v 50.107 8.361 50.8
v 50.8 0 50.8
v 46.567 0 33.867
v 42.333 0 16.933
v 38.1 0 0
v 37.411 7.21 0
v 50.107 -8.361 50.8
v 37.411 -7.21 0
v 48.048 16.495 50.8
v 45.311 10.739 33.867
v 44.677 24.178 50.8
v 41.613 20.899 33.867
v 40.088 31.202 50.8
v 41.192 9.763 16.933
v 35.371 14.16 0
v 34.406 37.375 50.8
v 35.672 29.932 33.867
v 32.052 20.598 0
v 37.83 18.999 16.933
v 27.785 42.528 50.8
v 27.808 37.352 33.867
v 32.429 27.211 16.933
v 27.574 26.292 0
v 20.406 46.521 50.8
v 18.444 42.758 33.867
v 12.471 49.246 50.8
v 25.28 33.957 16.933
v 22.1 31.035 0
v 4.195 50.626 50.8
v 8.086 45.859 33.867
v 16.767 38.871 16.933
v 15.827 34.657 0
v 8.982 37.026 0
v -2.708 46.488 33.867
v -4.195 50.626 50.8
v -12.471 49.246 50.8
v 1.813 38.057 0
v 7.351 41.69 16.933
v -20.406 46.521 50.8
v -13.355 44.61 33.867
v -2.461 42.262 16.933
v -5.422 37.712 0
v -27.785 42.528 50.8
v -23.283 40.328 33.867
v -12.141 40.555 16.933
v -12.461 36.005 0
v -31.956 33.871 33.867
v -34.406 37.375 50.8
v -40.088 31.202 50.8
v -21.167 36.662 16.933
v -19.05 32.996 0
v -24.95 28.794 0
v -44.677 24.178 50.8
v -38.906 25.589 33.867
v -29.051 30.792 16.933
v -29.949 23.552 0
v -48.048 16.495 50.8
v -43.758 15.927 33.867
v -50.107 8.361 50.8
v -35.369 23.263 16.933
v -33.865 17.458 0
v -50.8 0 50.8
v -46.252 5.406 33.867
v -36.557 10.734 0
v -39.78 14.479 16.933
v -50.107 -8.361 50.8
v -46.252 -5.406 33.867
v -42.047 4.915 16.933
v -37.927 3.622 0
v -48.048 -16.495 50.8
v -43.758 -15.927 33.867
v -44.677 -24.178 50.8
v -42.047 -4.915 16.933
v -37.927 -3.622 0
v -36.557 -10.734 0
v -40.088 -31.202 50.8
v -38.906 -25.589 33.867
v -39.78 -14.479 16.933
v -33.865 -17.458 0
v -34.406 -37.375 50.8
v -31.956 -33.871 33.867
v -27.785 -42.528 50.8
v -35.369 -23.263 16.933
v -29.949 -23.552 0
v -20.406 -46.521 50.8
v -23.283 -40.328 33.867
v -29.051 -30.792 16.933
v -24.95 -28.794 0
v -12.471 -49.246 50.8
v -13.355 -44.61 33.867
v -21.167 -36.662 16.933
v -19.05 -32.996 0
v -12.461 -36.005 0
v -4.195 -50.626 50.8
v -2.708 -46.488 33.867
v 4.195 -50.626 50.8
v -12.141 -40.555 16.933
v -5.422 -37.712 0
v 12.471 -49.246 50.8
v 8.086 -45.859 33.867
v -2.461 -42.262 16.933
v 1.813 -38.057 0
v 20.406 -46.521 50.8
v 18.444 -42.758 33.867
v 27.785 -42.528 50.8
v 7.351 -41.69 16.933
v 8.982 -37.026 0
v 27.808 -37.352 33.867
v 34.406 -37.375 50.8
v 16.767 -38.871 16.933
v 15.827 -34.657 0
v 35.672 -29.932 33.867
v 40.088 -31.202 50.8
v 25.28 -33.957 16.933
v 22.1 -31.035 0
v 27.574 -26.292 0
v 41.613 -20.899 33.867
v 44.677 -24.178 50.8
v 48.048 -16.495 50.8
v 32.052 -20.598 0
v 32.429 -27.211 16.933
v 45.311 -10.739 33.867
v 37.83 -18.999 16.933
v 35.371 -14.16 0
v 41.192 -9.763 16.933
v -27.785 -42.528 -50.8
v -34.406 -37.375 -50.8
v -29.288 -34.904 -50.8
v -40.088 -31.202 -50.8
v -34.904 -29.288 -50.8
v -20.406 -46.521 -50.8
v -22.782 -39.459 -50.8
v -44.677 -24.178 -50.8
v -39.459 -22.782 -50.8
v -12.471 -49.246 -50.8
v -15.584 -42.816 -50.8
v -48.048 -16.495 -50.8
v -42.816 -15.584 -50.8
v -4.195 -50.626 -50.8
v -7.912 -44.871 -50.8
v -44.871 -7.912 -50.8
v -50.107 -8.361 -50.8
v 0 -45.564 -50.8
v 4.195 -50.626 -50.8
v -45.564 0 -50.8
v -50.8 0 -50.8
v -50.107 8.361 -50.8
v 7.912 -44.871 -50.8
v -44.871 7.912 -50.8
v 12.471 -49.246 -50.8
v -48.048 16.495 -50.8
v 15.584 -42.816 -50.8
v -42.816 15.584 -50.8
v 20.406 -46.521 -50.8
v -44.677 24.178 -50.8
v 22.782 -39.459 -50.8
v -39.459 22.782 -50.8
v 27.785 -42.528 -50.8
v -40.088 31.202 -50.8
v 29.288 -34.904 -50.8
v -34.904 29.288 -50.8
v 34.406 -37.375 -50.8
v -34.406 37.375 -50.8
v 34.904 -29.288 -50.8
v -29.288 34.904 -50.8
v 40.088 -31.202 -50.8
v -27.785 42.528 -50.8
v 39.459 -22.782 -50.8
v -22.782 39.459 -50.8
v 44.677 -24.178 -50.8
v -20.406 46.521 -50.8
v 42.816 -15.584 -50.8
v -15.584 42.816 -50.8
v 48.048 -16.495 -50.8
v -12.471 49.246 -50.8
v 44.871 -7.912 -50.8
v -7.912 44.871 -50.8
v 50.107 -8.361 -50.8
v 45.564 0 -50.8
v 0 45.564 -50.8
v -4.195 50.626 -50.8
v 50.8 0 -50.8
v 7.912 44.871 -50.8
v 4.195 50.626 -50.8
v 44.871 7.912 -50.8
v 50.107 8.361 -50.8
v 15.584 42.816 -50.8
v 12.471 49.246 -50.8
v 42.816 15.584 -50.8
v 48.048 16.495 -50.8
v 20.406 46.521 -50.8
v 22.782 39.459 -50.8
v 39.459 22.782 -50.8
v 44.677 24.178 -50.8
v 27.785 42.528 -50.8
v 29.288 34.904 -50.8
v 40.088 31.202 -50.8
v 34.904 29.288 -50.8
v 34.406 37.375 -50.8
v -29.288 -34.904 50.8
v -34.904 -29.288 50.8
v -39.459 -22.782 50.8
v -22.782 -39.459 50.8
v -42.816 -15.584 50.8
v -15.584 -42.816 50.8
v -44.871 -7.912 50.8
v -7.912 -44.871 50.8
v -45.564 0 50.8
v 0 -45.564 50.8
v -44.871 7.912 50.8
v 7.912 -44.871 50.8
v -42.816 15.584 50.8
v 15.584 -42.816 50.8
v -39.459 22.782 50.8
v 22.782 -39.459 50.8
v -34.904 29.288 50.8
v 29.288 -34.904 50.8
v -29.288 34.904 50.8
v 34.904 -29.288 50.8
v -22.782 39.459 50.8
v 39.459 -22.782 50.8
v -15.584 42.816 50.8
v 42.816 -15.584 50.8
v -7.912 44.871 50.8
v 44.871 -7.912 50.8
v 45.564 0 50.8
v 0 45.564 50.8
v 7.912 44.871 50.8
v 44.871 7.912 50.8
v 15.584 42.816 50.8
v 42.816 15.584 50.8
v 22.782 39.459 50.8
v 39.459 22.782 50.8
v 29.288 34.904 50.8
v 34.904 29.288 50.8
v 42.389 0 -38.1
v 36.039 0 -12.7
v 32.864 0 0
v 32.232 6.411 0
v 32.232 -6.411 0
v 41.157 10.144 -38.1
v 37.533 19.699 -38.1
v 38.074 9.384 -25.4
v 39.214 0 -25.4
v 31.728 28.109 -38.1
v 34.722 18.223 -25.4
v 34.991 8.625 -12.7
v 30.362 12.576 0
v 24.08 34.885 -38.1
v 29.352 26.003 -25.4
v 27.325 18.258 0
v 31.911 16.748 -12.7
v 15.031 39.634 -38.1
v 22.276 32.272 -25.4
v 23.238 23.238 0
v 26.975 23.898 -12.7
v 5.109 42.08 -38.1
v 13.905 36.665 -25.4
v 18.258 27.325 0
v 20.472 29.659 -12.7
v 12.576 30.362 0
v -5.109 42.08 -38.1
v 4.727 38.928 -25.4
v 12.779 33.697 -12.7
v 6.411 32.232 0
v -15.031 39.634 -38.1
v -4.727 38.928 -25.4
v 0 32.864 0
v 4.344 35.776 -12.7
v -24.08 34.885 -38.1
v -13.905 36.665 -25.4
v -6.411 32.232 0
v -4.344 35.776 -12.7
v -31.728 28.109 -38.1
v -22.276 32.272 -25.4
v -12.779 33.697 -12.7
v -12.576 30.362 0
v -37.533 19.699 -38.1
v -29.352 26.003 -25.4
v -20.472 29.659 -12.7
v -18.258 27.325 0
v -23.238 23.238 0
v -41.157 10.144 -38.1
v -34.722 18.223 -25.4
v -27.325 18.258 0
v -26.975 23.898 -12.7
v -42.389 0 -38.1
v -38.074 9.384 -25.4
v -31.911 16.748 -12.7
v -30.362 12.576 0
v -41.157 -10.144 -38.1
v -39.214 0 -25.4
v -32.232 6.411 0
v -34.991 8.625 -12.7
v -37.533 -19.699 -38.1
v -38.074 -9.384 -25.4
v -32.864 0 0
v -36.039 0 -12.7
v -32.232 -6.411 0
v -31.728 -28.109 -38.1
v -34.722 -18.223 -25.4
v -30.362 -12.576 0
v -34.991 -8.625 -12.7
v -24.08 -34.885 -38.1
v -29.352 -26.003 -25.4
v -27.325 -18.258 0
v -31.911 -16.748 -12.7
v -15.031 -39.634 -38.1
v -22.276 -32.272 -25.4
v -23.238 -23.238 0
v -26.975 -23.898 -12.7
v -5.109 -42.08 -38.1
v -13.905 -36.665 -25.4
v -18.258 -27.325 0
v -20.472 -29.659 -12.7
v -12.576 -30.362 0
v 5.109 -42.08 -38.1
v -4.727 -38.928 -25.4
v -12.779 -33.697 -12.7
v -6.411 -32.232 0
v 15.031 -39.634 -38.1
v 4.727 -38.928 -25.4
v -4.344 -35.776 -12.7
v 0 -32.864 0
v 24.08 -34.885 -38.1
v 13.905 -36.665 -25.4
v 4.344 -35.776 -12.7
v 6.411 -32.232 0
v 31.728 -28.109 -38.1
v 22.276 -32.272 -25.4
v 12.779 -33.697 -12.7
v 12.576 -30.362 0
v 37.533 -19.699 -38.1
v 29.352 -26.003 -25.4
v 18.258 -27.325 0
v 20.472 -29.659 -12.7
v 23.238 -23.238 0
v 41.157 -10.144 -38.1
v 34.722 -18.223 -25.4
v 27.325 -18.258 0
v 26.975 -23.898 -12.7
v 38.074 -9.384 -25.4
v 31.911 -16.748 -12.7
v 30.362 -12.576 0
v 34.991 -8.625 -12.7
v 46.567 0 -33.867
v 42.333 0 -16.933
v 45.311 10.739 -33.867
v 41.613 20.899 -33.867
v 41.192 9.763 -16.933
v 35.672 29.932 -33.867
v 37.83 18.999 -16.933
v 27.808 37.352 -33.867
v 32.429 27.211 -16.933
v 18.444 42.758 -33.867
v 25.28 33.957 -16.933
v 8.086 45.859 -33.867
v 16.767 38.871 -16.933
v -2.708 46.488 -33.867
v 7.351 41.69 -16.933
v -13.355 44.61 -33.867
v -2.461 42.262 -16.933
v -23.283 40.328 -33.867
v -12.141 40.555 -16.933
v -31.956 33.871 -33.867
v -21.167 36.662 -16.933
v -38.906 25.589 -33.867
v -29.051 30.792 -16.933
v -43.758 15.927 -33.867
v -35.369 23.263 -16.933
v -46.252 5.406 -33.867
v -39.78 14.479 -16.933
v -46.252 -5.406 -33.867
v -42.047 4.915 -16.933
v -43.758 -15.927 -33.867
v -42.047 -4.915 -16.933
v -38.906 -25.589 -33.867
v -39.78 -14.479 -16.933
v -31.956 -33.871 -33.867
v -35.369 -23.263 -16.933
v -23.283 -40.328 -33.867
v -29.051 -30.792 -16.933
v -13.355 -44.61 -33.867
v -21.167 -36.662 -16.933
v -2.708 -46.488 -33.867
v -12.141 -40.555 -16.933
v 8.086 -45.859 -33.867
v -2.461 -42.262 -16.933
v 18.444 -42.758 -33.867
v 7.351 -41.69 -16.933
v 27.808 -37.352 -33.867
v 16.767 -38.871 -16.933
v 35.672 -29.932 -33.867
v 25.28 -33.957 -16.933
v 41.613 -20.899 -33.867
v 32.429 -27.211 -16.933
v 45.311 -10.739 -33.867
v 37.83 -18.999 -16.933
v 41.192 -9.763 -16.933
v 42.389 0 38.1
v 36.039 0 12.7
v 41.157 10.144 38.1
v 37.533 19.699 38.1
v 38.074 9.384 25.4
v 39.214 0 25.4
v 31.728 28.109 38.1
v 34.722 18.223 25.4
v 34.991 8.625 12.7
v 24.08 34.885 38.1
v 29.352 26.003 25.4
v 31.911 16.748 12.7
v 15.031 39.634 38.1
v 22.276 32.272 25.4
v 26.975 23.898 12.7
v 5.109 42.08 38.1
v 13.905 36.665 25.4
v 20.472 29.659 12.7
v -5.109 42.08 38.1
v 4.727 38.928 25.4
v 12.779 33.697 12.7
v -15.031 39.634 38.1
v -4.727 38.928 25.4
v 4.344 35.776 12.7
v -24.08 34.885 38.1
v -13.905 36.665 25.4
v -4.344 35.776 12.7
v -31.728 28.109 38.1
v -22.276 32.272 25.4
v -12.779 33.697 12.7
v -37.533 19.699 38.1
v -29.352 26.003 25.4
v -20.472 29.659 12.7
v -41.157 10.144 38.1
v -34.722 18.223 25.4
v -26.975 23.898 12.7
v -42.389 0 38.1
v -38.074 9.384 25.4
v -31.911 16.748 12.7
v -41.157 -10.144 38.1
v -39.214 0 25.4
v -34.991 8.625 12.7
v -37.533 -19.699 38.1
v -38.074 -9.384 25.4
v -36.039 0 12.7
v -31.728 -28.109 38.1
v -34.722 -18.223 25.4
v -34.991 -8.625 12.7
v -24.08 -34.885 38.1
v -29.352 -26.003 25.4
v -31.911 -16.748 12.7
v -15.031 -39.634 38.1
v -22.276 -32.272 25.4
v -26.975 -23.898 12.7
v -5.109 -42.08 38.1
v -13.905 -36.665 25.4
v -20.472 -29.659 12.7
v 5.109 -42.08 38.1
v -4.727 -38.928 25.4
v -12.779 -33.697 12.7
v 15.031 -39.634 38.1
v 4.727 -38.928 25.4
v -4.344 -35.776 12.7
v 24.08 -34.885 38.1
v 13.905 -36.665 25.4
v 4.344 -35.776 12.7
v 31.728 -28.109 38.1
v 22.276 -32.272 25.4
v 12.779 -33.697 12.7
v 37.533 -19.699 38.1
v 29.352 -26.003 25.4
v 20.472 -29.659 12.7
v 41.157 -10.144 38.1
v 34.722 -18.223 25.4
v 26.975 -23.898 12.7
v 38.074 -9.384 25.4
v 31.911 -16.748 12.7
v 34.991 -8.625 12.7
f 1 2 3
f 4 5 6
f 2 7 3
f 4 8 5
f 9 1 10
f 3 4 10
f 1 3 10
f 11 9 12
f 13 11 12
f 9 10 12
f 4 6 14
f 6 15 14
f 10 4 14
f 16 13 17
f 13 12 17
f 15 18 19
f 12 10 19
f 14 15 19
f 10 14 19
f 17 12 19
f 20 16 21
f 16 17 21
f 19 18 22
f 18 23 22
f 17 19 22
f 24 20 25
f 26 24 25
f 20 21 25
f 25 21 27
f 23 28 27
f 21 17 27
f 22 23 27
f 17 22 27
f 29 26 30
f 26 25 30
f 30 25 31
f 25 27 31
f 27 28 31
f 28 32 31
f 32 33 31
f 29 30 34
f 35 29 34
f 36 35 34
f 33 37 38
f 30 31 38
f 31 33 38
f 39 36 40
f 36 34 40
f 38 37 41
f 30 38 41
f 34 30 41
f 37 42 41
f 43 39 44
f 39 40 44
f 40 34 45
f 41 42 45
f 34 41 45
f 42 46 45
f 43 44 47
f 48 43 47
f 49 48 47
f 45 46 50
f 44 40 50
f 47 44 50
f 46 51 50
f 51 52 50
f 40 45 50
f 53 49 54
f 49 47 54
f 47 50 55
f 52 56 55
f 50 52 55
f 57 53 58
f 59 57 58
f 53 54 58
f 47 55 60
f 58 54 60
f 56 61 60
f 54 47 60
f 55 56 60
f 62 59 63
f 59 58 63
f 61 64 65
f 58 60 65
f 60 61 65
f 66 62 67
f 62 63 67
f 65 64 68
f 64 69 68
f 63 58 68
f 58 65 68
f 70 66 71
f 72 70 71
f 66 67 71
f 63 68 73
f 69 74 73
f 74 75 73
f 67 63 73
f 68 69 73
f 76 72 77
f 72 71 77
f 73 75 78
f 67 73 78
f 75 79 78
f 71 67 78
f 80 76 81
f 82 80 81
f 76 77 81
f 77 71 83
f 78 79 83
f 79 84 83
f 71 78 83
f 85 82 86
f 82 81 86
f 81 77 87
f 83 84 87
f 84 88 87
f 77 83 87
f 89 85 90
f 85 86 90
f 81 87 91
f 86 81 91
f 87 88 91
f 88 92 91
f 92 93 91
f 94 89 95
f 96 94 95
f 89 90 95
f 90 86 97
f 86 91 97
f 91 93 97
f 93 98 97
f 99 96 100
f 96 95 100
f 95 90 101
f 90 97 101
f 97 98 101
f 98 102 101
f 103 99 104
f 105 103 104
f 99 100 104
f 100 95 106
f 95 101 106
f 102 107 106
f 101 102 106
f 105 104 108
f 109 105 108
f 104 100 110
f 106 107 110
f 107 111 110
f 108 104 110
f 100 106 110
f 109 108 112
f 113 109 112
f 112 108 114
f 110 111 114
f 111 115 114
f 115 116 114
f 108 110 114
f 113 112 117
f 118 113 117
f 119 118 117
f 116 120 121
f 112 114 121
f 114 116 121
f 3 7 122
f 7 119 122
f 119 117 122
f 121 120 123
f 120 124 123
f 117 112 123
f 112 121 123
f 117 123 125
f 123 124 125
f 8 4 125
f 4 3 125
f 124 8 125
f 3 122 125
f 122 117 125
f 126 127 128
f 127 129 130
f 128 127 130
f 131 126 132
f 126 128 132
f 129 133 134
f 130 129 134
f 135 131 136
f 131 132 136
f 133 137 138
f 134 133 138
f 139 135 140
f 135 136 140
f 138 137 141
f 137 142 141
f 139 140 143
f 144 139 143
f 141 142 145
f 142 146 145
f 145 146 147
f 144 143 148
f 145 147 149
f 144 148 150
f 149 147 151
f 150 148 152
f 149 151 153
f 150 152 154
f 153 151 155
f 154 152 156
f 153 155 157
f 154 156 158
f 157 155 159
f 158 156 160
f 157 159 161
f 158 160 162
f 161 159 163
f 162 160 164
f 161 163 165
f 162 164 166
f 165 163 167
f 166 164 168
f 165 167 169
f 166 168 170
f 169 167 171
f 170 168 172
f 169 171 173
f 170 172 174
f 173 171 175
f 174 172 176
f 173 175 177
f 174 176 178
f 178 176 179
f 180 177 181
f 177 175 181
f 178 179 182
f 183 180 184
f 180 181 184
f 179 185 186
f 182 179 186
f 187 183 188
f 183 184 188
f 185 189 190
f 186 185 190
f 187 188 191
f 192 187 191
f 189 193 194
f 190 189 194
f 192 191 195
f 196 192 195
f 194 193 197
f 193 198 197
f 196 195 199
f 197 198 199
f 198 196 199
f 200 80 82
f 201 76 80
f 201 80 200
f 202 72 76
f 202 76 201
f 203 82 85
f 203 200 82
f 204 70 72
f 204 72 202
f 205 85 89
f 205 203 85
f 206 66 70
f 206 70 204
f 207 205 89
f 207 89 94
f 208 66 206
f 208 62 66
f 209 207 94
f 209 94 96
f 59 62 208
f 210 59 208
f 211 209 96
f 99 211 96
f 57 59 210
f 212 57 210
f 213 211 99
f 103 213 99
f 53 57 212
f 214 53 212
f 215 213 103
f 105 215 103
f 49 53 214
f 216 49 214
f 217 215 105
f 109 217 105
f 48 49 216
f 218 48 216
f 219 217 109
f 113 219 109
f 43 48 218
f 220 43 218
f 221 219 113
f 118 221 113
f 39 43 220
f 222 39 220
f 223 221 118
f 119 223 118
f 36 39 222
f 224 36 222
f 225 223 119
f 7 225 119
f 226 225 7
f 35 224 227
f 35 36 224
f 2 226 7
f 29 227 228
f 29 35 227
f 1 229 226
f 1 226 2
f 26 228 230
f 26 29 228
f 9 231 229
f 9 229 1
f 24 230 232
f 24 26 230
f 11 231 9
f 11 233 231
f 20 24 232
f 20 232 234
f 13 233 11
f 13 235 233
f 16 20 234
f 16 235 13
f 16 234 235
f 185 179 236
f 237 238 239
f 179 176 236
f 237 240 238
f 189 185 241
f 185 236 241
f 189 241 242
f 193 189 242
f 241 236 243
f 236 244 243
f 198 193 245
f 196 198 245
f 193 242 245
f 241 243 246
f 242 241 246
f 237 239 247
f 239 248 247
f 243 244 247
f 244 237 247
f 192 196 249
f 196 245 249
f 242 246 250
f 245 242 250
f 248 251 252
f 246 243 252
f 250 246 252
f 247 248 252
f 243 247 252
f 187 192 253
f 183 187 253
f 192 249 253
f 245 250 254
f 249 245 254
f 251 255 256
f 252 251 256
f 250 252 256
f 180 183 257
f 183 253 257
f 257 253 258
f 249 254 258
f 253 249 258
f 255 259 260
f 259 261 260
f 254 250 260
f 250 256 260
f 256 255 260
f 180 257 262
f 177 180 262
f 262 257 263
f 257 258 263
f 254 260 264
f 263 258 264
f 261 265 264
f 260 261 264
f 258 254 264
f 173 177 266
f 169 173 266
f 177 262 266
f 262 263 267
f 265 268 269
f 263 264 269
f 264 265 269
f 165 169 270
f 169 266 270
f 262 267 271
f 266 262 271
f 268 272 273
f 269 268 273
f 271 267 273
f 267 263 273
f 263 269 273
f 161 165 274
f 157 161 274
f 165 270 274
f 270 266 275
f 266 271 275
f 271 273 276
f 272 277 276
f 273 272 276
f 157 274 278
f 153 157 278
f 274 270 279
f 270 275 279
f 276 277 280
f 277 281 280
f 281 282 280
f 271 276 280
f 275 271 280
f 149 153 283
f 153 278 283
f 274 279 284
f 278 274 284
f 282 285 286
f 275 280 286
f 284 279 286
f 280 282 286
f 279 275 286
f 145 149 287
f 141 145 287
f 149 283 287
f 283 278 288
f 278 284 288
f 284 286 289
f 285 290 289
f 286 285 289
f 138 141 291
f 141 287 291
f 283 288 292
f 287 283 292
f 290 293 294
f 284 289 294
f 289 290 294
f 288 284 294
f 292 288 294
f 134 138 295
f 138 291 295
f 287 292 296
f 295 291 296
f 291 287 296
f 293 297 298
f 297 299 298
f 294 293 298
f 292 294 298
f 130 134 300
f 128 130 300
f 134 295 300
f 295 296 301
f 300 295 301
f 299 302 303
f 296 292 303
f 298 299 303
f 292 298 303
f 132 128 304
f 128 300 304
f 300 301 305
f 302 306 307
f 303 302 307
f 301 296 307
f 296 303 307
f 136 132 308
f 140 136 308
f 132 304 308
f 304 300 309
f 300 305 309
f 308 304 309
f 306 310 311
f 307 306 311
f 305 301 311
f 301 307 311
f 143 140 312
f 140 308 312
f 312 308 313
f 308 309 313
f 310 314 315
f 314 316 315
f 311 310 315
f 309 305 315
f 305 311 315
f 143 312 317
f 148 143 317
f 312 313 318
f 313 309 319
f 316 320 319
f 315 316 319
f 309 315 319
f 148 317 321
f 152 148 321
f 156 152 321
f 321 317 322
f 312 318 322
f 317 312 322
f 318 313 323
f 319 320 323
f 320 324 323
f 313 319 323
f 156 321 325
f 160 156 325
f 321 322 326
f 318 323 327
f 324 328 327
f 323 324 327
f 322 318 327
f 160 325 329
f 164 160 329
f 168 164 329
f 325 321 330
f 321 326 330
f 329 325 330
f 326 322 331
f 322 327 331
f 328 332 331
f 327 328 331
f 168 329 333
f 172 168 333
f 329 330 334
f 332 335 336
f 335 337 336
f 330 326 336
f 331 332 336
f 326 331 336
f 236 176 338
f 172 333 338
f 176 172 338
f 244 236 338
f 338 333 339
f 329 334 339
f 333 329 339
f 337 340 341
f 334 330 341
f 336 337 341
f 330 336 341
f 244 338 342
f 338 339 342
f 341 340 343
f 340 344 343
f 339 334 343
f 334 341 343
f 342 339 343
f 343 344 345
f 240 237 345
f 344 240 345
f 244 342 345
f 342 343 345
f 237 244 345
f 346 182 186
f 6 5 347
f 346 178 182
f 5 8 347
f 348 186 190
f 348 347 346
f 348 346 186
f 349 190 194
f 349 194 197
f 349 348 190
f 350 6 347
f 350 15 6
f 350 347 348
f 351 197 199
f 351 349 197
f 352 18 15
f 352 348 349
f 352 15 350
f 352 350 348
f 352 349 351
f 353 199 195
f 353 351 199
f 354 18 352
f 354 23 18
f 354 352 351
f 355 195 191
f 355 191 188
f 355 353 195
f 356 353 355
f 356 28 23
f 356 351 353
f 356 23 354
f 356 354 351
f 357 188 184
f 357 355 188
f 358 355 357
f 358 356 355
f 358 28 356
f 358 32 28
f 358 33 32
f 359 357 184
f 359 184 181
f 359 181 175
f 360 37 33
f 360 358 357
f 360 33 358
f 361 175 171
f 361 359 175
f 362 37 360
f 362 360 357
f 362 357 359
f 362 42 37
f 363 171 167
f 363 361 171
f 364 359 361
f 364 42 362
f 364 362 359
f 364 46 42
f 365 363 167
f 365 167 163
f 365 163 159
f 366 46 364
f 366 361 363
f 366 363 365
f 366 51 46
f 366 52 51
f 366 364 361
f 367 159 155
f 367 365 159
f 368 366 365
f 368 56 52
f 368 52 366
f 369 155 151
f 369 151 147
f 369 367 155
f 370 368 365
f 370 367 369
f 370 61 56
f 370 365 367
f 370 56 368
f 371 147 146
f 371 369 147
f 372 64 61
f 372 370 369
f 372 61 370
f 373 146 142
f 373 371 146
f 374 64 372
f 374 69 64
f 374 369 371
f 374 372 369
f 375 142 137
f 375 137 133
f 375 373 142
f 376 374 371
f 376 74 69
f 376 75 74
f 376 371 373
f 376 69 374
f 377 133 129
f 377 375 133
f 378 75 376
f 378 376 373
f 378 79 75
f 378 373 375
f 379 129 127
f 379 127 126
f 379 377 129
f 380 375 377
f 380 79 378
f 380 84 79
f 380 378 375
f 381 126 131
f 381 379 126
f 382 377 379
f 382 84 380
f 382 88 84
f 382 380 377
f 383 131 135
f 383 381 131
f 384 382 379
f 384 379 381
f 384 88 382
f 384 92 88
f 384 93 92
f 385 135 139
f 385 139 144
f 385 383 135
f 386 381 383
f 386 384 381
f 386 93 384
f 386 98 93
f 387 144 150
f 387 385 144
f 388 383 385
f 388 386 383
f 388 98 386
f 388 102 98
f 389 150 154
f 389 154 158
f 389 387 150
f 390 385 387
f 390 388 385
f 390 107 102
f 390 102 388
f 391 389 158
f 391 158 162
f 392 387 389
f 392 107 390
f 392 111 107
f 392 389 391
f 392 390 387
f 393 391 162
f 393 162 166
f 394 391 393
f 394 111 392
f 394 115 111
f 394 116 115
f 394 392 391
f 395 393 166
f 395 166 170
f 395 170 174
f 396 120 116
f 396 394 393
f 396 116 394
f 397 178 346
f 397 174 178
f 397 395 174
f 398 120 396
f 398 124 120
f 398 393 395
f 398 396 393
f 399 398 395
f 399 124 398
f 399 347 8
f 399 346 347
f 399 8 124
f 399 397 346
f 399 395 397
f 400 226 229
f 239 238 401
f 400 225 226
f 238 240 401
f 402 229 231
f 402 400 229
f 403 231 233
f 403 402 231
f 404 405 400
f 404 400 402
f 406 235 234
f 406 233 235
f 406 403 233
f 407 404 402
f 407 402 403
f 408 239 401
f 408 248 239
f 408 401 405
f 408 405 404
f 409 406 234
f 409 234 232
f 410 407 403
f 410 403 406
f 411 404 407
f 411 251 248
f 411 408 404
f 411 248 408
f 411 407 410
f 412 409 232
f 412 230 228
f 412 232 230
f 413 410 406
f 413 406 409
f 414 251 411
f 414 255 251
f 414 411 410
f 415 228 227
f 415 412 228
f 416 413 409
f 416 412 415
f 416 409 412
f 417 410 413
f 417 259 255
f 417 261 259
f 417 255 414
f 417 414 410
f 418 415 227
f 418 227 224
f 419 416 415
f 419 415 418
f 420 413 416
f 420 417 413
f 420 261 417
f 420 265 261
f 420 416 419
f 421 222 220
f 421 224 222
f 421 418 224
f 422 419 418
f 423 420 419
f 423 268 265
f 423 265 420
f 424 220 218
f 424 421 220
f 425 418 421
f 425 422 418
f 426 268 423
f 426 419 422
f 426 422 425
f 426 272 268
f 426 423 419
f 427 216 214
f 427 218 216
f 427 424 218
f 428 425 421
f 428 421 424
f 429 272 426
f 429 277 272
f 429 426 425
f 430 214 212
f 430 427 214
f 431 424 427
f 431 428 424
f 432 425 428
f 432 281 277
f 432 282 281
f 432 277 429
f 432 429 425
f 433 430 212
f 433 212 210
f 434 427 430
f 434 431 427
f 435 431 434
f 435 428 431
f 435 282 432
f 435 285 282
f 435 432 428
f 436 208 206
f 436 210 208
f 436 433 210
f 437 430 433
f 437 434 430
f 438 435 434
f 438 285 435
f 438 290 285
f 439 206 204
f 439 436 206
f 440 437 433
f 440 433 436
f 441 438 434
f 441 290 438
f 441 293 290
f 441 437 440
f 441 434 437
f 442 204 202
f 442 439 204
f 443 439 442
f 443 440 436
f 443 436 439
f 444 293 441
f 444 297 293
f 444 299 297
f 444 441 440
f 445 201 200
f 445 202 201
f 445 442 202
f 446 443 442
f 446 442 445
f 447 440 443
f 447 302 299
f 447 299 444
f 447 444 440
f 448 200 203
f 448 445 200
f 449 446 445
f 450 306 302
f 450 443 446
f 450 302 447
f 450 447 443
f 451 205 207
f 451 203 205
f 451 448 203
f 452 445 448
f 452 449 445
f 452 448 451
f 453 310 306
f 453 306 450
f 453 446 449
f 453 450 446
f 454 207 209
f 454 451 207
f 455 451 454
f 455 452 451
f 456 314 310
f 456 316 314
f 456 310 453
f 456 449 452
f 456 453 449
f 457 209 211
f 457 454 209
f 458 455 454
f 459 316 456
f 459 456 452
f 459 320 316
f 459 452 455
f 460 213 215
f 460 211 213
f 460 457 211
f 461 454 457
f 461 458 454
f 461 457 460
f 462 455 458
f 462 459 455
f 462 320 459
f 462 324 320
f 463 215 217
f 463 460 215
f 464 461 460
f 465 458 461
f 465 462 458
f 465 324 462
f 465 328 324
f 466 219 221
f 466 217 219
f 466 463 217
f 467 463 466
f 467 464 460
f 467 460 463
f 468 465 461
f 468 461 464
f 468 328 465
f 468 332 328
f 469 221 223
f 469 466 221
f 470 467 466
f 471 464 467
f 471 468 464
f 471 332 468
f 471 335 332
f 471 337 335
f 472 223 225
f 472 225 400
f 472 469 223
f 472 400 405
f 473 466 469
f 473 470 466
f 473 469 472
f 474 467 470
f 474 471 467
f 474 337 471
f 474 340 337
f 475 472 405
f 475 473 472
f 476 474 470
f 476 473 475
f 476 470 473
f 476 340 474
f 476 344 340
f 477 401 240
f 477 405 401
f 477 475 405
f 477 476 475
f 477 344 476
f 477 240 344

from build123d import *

# Parameters (mm, degrees)
F2_R = 50.8
F0_R = 38.1
F5_T = -5.08


with BuildPart() as f3:
    # F2 (on offset) → F3 section 0
    with BuildSketch(Plane.XY.offset(50.8)):
        Circle(F2_R)
    # F0 (on Top) → F3 section 1
    with BuildSketch(Plane.XY):
        Circle(F0_R)
    loft()

    # F4: F3 across plane


with BuildPart() as f3_1:
    add(f3.part)
    add(f3.part.mirror(Plane.XY))

    # F5
    f5_openings = [f3_1.faces().sort_by_distance(p)[0] for p in [
        (0, 0, -50.8),
        (0, 0, 50.8),
    ]]
    offset(amount=F5_T, openings=f5_openings, kind=Kind.INTERSECTION)


solid = f3_1.part
